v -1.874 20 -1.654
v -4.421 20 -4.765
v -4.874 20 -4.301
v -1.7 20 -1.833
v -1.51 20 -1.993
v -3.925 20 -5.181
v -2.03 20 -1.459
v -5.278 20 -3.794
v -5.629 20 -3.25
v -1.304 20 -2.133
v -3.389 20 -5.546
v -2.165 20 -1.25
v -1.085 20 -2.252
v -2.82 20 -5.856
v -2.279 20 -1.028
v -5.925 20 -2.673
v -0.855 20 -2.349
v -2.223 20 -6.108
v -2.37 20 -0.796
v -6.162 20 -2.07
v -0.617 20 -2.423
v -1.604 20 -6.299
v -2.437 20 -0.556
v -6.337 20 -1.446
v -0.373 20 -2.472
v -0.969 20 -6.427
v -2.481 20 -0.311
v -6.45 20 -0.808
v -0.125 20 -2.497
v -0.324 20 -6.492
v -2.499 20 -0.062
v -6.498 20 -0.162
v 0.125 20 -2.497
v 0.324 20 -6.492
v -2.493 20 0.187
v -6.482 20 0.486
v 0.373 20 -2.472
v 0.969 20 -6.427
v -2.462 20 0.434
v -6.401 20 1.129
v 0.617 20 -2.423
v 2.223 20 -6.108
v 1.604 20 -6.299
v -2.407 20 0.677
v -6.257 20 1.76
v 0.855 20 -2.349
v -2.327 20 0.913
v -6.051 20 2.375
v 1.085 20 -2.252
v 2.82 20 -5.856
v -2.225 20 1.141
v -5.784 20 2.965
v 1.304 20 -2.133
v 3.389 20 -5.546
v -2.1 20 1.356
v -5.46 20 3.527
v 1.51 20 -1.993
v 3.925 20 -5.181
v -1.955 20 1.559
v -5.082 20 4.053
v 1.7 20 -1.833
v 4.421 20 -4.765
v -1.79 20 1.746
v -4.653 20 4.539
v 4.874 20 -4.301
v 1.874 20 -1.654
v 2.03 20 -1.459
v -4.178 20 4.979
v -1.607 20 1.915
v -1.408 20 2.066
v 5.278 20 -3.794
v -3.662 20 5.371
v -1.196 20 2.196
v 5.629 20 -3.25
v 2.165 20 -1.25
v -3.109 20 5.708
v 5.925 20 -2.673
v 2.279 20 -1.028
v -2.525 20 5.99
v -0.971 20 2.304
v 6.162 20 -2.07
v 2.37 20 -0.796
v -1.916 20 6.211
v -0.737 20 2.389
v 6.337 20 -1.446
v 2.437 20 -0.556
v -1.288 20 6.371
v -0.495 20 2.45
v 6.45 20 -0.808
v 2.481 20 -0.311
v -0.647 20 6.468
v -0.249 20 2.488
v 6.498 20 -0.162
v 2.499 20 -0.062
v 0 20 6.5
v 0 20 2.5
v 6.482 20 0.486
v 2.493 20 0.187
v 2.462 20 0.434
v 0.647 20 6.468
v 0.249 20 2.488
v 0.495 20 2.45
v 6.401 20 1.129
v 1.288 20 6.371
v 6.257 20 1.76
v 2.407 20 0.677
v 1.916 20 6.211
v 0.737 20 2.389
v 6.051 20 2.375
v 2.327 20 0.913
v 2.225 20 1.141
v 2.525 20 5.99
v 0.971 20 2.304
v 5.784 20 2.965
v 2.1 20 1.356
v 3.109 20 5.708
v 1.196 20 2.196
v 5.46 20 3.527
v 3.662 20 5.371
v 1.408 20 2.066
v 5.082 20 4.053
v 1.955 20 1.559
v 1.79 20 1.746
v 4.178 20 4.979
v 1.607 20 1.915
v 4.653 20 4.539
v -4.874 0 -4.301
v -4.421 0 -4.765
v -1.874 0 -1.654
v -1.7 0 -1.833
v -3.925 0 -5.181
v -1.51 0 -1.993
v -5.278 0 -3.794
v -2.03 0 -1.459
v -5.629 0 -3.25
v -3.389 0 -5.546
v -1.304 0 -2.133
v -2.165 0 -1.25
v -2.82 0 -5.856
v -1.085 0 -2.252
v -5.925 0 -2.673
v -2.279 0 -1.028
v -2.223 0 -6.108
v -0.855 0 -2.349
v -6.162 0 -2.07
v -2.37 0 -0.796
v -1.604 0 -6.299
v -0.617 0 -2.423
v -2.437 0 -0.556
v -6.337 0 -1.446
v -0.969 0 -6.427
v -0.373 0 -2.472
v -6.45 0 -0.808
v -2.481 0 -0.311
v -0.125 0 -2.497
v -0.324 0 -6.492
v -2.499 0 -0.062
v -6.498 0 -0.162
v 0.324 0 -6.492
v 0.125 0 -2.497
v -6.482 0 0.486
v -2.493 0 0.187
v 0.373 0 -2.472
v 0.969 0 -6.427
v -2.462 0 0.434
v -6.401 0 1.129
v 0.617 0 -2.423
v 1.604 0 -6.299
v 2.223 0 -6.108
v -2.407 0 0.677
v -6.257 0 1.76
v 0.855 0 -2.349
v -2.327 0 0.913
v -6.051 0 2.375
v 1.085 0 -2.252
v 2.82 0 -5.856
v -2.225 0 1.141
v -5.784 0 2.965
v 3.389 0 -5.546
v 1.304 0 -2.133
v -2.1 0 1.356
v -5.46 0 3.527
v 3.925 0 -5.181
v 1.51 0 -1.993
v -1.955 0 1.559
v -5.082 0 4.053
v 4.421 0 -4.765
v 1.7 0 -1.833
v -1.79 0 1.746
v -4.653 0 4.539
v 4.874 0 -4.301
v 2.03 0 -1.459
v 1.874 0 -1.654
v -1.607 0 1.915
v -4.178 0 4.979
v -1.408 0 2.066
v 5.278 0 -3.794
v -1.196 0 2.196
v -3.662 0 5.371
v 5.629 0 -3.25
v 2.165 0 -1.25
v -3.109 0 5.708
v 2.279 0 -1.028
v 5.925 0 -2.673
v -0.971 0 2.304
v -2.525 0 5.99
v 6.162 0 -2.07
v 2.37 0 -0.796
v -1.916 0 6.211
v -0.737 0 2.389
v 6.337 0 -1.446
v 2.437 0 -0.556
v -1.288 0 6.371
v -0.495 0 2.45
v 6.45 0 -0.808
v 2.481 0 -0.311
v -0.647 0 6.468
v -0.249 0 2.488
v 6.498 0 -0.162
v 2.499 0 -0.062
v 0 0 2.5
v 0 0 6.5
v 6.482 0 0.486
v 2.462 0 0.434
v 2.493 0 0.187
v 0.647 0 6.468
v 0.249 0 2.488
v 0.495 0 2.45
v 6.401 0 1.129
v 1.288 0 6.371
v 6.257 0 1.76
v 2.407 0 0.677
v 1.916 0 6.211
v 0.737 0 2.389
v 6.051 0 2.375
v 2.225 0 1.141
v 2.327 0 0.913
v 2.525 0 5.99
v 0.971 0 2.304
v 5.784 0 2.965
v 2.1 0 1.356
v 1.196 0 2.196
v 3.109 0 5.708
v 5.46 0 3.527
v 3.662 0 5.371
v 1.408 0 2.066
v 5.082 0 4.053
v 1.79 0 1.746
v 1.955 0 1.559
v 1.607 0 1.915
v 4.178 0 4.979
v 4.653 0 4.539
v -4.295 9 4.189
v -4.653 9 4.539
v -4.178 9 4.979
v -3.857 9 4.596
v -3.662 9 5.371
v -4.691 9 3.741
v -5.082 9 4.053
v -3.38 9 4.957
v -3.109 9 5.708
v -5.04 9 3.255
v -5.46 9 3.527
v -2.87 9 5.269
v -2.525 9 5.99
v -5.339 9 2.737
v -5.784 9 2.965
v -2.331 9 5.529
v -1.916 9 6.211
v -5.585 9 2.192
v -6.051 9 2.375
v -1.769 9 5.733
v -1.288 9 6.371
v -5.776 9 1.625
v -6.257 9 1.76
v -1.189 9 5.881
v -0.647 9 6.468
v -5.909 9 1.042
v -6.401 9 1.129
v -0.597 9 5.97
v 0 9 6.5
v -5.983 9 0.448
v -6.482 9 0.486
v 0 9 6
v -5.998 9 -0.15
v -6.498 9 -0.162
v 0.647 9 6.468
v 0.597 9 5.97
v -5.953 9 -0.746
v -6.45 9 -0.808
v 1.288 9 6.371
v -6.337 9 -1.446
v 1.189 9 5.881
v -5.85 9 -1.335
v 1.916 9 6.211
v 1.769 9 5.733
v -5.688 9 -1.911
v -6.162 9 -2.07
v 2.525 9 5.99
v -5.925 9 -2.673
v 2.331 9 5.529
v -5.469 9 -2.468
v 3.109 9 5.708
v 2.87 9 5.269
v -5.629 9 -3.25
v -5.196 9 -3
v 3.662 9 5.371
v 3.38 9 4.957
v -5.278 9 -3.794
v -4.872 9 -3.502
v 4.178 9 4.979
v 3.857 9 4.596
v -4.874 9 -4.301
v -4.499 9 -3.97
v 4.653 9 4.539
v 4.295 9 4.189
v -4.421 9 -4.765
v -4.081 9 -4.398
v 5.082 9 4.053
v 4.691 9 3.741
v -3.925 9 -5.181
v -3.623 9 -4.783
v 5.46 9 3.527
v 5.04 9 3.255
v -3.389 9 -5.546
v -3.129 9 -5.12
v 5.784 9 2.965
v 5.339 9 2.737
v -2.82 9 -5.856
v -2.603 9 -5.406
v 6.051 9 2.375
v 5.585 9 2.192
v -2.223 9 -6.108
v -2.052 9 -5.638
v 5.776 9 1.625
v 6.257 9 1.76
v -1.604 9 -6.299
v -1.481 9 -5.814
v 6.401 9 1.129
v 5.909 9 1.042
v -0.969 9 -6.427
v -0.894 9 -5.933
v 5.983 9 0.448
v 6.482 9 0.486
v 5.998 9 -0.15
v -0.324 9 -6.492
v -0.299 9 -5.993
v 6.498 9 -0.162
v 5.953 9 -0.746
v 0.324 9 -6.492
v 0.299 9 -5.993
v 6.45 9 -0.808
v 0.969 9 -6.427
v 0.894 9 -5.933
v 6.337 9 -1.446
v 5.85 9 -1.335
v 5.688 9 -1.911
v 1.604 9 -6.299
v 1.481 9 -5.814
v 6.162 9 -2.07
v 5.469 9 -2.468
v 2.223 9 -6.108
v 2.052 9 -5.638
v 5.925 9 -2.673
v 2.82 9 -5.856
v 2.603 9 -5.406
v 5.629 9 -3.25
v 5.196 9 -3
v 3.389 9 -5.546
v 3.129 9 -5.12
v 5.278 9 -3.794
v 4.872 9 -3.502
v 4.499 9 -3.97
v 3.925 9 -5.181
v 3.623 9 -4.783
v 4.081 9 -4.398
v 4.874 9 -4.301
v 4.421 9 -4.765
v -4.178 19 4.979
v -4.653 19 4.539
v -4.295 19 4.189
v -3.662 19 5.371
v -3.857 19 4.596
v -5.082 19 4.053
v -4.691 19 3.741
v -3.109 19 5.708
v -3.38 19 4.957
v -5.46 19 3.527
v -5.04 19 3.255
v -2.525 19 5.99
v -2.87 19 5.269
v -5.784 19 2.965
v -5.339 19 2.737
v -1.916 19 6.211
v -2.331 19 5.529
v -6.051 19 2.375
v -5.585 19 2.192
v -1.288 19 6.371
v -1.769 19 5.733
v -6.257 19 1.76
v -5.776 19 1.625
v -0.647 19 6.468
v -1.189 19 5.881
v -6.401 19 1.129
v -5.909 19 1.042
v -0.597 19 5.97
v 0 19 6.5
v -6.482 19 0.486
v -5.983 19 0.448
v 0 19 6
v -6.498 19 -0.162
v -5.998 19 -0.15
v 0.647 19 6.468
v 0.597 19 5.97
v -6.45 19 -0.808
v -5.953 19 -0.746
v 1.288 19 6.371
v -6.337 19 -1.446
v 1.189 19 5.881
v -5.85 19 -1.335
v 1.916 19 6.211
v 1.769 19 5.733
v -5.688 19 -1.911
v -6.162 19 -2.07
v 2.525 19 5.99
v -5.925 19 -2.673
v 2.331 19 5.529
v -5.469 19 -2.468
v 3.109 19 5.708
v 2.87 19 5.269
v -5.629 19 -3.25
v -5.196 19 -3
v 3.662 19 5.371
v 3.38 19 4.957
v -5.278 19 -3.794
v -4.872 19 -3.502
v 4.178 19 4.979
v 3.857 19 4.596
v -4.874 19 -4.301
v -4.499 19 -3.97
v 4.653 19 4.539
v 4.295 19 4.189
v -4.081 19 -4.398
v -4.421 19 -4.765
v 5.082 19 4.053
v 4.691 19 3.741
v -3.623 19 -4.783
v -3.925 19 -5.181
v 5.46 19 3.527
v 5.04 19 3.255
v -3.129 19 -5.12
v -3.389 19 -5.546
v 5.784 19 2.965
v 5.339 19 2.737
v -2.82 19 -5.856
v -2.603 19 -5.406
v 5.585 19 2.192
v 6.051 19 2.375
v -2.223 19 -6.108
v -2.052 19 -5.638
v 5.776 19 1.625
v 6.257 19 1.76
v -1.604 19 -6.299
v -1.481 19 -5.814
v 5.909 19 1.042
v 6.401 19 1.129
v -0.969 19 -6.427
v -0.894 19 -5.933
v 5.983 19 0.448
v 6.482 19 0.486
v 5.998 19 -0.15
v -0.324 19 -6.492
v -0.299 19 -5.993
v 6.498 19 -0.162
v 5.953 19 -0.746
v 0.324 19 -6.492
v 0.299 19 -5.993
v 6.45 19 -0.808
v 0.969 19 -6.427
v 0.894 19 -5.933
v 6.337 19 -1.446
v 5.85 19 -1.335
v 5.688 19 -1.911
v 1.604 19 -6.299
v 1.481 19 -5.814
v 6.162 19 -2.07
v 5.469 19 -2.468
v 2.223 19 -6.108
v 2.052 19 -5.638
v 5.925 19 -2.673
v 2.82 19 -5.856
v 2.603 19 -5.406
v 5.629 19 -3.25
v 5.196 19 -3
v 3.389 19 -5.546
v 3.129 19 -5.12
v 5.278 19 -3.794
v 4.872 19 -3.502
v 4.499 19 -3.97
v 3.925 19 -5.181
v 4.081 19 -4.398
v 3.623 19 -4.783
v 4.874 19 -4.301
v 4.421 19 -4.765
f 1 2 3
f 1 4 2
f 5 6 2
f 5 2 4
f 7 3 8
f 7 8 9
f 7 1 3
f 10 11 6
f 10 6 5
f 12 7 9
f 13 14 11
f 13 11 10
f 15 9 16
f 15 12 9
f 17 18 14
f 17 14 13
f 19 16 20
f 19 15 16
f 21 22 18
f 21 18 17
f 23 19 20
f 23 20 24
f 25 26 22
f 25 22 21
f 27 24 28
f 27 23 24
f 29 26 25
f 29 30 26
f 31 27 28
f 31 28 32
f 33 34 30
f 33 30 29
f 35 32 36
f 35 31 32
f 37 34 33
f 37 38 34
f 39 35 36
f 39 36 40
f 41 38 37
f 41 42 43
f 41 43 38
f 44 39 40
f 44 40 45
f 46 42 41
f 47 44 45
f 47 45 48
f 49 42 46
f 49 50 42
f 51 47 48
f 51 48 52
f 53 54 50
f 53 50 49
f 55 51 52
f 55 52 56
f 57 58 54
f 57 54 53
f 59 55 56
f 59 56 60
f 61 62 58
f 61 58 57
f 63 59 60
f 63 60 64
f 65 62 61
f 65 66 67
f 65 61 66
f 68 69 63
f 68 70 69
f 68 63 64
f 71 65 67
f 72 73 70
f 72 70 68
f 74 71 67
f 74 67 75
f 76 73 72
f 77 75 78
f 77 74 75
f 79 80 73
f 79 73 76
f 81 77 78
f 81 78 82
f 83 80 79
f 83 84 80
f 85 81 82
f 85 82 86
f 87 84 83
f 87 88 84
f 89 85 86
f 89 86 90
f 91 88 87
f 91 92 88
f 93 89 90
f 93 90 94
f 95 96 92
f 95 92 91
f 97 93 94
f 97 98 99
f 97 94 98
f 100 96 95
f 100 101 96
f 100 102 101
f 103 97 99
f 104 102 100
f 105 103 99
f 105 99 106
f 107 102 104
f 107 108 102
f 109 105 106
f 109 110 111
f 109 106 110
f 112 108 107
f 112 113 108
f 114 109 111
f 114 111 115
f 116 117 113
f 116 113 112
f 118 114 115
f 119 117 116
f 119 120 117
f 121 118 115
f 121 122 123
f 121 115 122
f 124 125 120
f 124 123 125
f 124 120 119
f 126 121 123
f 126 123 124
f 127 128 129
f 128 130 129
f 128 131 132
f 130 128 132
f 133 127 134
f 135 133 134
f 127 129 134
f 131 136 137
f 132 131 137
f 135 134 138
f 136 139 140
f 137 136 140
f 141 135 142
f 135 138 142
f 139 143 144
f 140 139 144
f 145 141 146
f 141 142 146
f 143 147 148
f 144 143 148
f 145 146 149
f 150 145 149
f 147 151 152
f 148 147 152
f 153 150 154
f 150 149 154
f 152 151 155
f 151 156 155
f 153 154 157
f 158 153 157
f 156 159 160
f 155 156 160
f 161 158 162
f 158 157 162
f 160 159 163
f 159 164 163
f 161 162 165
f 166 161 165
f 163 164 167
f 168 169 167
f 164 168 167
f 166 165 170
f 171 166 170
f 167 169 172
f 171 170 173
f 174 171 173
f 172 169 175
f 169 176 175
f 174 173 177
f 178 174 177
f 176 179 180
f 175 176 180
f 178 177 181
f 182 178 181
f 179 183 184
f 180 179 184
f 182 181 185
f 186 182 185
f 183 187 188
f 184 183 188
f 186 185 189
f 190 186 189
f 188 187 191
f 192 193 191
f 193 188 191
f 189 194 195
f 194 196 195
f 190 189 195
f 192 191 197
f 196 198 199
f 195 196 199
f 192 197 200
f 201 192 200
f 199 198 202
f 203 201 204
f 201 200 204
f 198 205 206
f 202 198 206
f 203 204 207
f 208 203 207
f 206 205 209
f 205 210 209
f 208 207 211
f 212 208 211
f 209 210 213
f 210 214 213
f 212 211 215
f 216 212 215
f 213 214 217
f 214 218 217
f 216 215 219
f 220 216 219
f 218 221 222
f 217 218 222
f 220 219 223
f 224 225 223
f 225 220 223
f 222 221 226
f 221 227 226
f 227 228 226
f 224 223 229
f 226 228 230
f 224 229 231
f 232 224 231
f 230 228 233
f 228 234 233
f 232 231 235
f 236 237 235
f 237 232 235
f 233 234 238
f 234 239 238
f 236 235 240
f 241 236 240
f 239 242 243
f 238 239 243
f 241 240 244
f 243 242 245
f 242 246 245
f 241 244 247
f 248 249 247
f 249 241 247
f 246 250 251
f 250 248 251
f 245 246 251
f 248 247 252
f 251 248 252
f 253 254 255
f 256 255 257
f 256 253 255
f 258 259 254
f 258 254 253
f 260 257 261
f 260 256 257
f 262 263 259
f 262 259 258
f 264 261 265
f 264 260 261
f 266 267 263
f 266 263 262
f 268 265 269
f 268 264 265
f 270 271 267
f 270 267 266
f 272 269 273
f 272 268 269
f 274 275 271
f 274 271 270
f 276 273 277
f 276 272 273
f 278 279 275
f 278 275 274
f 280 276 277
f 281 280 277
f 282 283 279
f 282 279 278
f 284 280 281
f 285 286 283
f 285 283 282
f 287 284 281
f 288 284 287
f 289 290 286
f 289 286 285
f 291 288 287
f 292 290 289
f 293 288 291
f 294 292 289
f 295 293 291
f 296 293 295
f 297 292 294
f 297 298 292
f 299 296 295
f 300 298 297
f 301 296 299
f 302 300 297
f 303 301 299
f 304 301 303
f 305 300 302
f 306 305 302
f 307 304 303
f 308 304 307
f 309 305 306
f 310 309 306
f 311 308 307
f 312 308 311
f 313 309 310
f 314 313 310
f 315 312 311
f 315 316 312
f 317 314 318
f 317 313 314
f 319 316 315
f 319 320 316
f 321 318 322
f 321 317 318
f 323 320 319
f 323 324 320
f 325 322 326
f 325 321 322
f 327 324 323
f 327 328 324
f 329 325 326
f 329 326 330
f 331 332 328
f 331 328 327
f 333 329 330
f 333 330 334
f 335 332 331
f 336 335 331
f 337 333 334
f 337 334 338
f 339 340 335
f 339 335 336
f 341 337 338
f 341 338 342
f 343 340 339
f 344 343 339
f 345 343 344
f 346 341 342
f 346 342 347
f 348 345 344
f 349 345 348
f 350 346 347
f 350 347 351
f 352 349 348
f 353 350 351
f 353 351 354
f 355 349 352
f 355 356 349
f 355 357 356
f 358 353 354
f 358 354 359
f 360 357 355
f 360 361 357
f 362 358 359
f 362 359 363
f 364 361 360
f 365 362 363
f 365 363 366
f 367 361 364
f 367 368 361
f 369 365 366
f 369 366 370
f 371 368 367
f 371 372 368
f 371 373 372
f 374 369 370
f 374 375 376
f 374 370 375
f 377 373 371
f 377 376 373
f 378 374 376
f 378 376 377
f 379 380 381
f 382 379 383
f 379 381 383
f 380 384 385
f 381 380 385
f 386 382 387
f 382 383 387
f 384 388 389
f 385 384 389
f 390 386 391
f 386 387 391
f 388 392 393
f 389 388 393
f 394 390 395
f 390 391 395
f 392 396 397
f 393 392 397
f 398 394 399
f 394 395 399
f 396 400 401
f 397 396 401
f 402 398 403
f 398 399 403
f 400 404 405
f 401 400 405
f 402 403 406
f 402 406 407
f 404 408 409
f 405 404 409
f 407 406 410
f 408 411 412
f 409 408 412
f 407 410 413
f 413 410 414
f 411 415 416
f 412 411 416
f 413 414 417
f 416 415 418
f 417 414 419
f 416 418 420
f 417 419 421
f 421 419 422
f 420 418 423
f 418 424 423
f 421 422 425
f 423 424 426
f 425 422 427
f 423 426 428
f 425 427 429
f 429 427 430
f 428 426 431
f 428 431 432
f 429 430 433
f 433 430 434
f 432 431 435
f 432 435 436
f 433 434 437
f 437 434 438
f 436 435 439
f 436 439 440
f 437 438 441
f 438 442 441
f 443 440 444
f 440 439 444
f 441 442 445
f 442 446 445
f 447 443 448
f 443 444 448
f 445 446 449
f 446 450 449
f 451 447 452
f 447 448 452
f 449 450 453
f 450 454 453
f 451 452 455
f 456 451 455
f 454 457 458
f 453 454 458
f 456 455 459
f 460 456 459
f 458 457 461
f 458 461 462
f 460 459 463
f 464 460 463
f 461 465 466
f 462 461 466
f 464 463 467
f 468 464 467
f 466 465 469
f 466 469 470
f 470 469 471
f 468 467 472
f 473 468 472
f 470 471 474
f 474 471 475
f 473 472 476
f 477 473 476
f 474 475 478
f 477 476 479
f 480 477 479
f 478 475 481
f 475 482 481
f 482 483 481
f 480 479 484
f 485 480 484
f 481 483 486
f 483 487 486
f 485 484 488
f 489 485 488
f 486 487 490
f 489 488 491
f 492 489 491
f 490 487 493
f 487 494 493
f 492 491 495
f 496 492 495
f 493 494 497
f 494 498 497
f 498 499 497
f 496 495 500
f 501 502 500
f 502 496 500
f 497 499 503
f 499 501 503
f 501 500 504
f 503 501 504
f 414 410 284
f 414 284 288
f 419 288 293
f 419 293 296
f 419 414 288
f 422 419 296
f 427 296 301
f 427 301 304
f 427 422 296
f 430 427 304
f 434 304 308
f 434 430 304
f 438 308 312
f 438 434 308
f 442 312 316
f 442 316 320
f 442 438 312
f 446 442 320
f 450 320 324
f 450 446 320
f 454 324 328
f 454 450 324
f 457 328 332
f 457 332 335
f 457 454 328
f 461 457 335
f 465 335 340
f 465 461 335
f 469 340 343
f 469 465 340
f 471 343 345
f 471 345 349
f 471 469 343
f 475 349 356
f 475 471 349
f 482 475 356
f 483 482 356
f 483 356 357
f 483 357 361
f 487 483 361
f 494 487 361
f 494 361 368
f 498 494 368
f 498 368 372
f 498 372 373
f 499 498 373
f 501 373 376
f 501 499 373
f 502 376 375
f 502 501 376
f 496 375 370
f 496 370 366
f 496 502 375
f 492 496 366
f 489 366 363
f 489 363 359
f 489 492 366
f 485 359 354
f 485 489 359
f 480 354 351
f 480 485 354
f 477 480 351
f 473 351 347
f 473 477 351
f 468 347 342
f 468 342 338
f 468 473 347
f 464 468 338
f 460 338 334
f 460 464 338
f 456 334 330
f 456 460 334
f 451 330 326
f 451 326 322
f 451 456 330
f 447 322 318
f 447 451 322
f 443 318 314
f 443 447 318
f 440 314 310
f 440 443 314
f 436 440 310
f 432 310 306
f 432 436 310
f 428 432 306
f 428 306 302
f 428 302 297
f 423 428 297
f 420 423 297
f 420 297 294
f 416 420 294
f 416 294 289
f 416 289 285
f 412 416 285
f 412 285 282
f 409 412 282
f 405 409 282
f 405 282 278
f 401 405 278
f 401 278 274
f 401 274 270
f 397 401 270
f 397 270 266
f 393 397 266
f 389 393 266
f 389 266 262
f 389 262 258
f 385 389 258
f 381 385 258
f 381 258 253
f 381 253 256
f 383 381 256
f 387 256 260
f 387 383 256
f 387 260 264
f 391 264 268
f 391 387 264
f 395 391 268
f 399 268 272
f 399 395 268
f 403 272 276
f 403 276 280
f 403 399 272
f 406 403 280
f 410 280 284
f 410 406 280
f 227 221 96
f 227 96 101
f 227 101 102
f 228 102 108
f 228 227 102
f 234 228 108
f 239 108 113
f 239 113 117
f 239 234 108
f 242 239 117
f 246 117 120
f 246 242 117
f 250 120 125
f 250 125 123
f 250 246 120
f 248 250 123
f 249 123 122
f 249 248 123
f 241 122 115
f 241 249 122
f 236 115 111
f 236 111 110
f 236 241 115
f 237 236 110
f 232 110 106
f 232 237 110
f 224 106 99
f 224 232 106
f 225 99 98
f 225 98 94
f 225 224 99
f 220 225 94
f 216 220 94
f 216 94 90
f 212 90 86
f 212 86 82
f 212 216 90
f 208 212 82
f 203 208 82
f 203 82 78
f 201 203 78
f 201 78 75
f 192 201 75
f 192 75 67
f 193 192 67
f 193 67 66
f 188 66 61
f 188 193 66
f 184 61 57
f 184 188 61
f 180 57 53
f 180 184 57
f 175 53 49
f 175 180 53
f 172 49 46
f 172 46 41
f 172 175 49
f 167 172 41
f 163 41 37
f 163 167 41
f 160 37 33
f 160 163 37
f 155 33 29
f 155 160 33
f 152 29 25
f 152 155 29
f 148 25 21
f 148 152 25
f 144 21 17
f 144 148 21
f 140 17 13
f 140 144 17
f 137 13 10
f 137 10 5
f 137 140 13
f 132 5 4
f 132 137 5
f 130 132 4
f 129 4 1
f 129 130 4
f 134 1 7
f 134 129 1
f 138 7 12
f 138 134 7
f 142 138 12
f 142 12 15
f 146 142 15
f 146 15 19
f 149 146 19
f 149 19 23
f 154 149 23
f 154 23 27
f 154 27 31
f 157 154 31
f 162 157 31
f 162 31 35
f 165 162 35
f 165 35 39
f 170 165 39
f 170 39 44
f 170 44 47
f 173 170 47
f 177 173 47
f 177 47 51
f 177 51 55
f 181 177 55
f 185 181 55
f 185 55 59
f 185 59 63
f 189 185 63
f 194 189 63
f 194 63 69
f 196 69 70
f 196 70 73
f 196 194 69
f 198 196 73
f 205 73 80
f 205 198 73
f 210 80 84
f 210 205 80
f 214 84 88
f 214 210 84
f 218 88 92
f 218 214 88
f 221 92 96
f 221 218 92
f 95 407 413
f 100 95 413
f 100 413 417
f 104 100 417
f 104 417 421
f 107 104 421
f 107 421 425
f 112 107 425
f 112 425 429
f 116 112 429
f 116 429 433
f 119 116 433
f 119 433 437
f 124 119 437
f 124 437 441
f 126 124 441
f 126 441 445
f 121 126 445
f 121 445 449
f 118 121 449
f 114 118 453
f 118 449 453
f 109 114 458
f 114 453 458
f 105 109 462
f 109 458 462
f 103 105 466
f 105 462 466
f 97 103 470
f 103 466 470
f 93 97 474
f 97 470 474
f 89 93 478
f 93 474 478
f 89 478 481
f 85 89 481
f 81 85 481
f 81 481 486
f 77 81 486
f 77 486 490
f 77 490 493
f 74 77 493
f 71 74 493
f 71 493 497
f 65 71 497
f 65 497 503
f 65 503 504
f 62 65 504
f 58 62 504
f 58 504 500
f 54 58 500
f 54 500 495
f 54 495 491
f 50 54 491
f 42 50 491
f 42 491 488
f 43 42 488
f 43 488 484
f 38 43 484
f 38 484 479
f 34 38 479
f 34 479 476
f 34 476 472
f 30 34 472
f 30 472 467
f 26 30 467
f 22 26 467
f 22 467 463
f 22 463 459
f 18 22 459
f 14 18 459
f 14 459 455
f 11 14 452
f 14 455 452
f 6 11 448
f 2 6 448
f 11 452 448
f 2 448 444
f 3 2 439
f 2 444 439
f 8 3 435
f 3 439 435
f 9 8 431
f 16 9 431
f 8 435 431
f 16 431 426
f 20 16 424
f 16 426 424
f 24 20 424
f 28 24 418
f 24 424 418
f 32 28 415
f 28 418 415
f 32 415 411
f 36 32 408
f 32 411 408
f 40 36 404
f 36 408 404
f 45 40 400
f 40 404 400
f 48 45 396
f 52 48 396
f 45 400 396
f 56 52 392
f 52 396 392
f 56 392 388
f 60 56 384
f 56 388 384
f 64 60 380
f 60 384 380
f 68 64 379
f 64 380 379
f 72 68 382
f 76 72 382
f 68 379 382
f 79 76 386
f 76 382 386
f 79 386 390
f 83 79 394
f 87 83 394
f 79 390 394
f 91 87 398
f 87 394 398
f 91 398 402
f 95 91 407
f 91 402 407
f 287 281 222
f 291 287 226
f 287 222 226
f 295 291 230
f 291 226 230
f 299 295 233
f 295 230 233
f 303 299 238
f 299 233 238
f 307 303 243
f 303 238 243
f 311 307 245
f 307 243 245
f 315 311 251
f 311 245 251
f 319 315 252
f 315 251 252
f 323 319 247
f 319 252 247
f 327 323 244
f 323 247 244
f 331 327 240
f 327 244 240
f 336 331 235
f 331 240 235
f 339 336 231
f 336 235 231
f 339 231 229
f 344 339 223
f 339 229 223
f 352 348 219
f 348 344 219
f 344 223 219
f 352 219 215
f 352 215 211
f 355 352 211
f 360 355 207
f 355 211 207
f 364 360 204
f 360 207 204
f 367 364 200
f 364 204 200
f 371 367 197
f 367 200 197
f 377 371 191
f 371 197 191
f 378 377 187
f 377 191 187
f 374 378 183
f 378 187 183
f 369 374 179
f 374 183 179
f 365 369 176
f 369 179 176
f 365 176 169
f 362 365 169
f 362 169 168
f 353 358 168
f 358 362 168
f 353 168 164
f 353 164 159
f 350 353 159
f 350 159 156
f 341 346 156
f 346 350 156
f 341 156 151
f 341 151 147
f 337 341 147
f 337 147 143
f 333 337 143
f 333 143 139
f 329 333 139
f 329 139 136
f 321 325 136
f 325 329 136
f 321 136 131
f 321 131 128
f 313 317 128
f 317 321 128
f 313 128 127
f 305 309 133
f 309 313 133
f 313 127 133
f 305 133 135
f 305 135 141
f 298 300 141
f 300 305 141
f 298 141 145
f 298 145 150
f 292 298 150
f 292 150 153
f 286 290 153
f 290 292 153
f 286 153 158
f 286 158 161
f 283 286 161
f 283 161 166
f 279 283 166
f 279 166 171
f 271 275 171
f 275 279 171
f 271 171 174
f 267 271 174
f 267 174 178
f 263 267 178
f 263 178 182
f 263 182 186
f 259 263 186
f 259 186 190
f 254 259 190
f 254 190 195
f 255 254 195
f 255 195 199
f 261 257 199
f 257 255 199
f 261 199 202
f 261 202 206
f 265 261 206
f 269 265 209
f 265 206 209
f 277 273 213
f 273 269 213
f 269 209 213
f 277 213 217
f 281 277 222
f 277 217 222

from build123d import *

# Parameters (mm, degrees)
SKETCH1_R           = 6.5
SKETCH1_R_2         = 2.5
BOSS_EXTRUDE1_DEPTH = 20
SKETCH2_R           = 6.793151268
SKETCH2_R_2         = 6
CUT_EXTRUDE1_DEPTH  = 10


with BuildPart() as part:
    # Sketch1 → Boss-Extrude1 (new body)
    with BuildSketch(Plane(origin=(0, 0, 0), x_dir=(1, 0, 0), z_dir=(0, 1, 0))):
        with Locations(Location((0, 0, 0), (0, 0, 270))):
            Circle(SKETCH1_R)
        with Locations(Location((0, 0, 0), (0, 0, 270))):
            Circle(SKETCH1_R_2, mode=Mode.SUBTRACT)
    extrude(amount=BOSS_EXTRUDE1_DEPTH)

    # Sketch2 → Cut-Extrude1 (cut)
    with BuildSketch(Plane(origin=(0, 19, 0), x_dir=(1, 0, 0), z_dir=(0, 1, 0))):
        Circle(SKETCH2_R)
        with Locations(Location((0, 0, 0), (0, 0, 270))):
            Circle(SKETCH2_R_2, mode=Mode.SUBTRACT)
    extrude(amount=-CUT_EXTRUDE1_DEPTH, mode=Mode.SUBTRACT)


solid = part.part
